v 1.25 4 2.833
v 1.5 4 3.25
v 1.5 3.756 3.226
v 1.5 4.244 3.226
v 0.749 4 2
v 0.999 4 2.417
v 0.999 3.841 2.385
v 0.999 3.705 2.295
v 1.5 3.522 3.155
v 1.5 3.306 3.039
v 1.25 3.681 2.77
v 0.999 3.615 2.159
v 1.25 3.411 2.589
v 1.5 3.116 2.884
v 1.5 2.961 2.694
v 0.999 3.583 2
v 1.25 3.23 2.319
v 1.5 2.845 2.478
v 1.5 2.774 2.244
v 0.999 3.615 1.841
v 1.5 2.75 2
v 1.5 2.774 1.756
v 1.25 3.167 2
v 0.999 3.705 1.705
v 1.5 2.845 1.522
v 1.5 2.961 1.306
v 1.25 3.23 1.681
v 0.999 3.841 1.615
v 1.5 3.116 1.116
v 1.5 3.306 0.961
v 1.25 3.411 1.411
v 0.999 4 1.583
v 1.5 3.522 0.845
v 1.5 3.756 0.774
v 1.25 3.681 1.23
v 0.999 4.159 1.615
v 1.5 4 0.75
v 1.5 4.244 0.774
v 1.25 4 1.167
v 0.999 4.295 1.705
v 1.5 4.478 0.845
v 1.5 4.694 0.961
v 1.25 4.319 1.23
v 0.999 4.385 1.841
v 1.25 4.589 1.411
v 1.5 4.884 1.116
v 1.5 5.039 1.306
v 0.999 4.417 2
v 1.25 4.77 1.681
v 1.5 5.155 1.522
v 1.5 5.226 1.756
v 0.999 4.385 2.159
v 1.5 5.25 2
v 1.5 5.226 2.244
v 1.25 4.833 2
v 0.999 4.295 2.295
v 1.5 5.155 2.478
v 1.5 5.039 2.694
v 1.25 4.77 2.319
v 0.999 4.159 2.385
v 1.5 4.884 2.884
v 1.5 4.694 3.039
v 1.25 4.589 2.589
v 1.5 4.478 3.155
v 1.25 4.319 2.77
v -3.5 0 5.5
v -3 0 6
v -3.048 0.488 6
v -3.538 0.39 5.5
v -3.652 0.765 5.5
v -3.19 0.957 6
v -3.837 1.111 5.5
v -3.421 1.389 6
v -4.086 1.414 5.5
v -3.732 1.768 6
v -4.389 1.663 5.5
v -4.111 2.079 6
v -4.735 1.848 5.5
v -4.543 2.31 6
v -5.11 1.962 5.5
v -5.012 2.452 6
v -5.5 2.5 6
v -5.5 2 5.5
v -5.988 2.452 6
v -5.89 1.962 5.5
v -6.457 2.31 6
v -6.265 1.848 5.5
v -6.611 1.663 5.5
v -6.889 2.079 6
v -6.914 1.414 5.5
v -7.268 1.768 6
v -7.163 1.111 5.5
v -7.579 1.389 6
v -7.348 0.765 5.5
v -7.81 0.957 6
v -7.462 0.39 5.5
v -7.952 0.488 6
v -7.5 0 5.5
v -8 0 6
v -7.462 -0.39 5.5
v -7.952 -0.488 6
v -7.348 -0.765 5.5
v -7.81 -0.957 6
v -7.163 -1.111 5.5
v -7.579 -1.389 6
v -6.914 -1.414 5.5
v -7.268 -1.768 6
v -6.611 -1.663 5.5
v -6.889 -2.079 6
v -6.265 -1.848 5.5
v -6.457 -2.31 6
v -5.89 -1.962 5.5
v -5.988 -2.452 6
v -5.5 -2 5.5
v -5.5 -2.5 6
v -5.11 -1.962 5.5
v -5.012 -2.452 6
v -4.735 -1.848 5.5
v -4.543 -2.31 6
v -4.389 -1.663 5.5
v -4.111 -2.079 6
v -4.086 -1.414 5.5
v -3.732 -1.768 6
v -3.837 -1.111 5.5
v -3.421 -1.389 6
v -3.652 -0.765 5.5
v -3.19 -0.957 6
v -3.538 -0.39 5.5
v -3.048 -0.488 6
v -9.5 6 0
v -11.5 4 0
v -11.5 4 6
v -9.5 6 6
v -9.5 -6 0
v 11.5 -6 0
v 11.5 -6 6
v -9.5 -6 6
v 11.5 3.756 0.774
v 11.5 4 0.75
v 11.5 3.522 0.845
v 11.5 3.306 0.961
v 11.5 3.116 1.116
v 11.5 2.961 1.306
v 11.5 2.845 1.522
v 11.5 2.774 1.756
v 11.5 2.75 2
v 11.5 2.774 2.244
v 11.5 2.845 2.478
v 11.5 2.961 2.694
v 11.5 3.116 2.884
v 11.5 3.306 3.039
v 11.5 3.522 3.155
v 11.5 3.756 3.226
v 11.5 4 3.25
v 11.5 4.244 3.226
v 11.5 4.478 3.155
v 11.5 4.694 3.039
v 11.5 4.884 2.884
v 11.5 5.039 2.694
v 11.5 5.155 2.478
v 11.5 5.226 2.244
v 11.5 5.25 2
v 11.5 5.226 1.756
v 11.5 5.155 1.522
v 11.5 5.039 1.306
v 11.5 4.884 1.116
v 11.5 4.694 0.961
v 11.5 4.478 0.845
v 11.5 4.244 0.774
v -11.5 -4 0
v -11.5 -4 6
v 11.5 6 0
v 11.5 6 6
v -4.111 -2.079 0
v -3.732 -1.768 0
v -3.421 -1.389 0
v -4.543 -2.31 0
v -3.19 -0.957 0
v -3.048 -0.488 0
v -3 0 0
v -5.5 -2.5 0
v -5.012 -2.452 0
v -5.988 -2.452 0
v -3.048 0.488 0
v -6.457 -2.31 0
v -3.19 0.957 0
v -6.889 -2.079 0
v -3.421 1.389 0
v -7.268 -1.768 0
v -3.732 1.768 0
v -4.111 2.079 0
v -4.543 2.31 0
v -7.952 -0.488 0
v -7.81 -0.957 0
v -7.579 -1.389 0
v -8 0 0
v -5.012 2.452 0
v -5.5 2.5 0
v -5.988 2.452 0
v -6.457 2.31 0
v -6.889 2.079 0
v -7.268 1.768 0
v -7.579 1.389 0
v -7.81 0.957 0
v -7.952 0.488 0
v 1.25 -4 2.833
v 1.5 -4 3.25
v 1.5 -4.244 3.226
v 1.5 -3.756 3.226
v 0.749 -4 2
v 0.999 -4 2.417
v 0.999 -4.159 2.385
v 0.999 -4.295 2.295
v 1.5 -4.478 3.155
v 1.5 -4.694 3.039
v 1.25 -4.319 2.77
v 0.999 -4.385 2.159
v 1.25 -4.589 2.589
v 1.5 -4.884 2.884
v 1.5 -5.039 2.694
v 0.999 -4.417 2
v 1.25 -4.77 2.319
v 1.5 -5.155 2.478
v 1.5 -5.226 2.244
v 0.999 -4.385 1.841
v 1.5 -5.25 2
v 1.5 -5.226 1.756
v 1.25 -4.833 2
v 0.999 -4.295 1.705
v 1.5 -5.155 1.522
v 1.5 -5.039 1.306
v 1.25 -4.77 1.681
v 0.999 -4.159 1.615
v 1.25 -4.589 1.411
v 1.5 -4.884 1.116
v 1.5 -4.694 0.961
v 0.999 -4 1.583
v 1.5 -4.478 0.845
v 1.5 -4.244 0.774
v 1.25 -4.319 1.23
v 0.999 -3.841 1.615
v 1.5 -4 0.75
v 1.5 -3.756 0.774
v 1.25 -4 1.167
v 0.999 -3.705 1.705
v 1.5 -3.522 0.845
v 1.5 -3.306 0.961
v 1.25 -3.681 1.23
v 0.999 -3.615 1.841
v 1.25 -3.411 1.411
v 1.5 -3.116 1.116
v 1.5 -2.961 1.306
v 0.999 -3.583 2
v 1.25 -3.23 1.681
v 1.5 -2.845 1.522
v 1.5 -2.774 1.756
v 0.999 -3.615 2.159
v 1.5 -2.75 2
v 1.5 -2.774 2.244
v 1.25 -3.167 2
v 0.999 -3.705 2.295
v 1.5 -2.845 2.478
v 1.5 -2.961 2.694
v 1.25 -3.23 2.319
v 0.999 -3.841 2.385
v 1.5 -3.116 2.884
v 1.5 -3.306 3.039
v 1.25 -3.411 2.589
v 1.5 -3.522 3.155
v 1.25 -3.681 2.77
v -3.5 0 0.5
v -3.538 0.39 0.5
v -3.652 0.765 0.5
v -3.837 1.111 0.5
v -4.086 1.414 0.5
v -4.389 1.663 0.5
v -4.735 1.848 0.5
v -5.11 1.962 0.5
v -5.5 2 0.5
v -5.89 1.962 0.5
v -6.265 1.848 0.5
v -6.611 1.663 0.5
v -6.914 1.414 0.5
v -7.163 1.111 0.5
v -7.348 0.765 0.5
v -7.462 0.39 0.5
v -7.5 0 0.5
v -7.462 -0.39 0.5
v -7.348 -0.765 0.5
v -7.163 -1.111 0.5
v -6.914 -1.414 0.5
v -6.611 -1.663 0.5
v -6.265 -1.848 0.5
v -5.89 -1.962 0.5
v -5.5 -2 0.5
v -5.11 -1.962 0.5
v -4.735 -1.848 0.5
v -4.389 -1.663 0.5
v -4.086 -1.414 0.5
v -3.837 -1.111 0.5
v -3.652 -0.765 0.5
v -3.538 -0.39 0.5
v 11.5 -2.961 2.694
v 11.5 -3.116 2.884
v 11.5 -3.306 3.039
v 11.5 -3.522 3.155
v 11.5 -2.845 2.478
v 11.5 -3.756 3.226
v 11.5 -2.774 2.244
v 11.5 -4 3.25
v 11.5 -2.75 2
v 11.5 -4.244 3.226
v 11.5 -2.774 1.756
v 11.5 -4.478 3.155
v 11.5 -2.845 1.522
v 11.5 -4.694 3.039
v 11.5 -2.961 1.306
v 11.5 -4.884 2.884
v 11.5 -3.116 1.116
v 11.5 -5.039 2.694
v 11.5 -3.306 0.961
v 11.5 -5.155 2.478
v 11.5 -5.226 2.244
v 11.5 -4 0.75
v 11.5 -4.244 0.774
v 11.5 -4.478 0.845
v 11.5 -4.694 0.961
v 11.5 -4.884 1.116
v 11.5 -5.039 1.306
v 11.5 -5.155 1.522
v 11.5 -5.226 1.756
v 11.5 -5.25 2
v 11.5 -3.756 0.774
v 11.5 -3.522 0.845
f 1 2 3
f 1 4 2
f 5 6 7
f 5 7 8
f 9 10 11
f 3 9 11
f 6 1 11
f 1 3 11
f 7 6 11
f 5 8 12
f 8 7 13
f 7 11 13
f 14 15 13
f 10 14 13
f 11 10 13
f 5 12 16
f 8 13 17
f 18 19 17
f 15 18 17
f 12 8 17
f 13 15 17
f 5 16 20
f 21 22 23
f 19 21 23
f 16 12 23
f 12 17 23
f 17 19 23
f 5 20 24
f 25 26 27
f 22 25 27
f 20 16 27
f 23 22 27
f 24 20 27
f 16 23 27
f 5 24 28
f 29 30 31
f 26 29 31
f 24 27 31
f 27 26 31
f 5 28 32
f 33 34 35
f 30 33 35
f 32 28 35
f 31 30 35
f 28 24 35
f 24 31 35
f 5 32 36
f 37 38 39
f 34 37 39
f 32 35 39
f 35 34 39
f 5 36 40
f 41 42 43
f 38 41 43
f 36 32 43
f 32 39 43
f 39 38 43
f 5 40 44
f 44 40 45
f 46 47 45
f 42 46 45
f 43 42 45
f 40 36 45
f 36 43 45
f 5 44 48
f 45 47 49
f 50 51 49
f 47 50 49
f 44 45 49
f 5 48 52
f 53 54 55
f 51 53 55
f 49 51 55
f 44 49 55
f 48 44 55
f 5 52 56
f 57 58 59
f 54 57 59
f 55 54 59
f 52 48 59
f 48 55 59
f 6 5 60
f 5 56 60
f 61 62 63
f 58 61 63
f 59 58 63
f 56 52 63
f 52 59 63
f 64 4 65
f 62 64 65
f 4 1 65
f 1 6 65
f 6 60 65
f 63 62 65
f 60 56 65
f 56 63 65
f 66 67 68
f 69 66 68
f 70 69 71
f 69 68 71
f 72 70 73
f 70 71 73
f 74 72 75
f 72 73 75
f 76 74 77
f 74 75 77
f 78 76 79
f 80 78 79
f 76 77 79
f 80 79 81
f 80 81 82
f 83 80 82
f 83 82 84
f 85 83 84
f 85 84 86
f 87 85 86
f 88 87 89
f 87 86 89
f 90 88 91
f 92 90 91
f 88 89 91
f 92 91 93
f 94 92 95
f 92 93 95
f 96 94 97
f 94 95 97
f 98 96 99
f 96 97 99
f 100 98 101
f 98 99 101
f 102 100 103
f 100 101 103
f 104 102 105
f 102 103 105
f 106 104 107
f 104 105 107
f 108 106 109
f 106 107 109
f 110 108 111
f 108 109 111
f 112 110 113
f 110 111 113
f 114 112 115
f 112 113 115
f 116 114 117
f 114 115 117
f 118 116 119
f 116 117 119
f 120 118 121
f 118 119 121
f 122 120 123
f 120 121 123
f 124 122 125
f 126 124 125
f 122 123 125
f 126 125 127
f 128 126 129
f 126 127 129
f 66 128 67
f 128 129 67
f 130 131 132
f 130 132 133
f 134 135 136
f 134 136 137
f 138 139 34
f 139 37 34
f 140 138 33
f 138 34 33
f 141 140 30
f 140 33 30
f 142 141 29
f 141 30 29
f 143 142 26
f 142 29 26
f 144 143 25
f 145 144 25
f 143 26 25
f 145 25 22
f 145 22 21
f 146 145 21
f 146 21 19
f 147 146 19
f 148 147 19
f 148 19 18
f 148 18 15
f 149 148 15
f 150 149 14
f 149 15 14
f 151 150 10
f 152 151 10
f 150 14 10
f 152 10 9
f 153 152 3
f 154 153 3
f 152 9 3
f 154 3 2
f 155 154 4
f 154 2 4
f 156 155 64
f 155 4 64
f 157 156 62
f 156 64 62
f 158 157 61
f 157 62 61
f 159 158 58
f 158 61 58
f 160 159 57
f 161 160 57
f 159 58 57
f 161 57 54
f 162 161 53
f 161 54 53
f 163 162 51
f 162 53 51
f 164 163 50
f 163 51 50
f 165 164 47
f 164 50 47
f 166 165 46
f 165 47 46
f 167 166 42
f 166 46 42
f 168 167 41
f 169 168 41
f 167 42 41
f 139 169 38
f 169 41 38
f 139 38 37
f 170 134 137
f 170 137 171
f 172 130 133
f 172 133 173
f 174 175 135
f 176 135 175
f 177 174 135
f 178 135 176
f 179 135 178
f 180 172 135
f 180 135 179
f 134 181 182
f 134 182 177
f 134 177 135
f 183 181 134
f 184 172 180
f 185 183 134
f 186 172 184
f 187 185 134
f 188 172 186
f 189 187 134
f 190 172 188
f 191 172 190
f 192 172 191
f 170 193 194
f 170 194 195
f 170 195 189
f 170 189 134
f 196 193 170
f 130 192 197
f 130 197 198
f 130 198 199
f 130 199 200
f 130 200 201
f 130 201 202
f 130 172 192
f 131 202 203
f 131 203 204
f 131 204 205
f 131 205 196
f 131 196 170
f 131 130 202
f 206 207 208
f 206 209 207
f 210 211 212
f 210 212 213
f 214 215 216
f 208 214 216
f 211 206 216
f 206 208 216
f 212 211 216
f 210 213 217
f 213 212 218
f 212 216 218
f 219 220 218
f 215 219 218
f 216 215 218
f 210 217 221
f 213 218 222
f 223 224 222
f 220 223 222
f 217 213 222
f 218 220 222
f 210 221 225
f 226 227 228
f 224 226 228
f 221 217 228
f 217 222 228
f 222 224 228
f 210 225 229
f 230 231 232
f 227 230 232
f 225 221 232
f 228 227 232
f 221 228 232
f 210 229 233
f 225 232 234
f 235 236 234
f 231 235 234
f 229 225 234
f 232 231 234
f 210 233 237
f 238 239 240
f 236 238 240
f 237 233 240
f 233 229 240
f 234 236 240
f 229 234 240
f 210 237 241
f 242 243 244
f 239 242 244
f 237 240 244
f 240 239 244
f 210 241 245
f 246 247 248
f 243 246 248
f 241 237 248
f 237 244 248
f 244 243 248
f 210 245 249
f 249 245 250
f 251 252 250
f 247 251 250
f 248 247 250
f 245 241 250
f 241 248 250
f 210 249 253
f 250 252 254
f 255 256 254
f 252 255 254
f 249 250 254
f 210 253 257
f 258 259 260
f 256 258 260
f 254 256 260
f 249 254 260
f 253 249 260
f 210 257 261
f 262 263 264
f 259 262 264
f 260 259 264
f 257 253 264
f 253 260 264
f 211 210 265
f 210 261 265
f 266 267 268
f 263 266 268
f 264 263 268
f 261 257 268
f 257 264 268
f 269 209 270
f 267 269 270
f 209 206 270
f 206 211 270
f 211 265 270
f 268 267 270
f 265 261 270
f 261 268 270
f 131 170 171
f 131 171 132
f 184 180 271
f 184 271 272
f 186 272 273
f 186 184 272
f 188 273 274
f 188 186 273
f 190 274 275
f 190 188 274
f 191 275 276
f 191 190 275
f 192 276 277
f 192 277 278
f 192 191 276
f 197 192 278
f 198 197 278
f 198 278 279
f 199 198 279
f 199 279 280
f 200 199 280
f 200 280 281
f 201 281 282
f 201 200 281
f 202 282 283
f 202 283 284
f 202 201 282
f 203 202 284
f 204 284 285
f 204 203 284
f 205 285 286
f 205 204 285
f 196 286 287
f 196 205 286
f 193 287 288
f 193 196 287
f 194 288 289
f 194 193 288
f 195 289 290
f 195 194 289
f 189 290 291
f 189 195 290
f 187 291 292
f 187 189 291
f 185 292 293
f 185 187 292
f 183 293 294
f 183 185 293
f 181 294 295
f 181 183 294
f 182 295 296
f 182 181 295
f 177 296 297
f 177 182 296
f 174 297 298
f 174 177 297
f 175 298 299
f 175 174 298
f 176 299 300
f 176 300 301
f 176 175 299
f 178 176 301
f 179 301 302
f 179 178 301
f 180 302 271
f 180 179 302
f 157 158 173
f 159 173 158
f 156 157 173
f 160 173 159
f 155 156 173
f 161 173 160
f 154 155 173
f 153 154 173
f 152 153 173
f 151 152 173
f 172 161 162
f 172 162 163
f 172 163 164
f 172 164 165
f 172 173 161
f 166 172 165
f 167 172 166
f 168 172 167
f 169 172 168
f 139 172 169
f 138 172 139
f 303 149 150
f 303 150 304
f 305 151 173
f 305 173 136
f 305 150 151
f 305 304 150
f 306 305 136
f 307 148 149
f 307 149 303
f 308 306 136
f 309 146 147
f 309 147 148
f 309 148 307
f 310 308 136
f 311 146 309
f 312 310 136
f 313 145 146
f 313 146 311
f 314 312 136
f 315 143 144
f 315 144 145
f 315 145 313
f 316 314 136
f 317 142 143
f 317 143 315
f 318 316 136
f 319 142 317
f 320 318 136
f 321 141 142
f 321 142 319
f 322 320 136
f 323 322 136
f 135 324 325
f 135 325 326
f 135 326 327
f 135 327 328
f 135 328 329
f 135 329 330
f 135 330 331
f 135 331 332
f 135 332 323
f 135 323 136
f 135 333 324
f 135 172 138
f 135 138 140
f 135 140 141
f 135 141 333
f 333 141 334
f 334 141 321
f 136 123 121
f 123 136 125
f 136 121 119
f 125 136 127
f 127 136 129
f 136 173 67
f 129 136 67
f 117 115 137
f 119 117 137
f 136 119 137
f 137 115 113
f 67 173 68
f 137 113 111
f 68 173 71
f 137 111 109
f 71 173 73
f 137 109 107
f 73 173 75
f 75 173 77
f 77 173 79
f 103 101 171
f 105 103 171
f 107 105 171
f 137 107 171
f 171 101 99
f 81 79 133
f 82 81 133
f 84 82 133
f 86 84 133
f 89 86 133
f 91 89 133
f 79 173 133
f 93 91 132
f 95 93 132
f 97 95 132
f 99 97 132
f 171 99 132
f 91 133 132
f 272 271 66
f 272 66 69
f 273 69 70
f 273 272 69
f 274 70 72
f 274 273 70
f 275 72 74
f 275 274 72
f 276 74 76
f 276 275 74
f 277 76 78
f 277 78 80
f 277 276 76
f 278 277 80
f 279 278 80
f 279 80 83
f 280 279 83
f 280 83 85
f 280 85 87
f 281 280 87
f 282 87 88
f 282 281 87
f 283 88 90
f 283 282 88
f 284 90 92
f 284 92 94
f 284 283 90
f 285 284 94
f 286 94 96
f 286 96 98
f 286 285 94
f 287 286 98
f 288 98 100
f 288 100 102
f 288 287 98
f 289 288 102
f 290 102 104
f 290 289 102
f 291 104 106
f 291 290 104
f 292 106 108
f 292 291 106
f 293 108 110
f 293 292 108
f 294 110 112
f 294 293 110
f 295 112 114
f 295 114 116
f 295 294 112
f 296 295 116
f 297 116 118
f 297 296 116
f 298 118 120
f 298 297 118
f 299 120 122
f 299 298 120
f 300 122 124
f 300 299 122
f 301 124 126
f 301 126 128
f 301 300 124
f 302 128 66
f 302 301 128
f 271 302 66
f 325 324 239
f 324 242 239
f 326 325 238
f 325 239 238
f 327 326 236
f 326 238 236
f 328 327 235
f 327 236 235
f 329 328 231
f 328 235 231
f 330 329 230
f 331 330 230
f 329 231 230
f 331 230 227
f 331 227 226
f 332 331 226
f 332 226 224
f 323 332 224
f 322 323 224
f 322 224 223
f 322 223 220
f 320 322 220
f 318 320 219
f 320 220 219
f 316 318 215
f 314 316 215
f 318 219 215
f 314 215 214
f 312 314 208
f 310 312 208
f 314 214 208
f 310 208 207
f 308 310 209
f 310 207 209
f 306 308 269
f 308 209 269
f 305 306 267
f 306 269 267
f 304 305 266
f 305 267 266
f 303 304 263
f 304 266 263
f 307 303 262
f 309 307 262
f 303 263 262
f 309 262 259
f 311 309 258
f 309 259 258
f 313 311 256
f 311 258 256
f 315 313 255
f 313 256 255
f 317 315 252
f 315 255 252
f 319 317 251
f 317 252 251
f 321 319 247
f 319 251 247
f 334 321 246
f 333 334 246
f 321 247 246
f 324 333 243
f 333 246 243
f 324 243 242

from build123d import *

# Parameters (mm, degrees)
SKETCH5_R                 = 2
BOSS_EXTRUDE3_DEPTH       = 6
CHAMFER1_SIZE             = 0.5
M3X0_5_TAPPED_HOLE2_D     = 2.5
M3X0_5_TAPPED_HOLE2_DEPTH = 10
M3X0_5_TAPPED_HOLE2_TIP   = 0.751075774


with BuildPart() as part:
    # Sketch5 → Boss-Extrude3 (new body)
    with BuildSketch(Plane.XY):
        Polygon((-9.5, -6), (-11.5, -4), (-11.5, 4), (-9.5, 6), (11.5, 6), (11.5, -6), align=None)
        with Locations((-5.5, 0)):
            Circle(SKETCH5_R, mode=Mode.SUBTRACT)
    extrude(amount=BOSS_EXTRUDE3_DEPTH)

    # Chamfer1
    chamfer1_edges = [part.edges().sort_by_distance(p)[0] for p in [
        (-7.5, 0, 0),
        (-7.5, 0, 6),
    ]]
    chamfer(chamfer1_edges, length=CHAMFER1_SIZE)

    # M3x0.5 Tapped Hole2
    with Locations(Plane(origin=(11.5, 4, 2), x_dir=(0, 0, 1), z_dir=(1, 0, 0))):
        with Locations((0, 0), (0, 8)):
            Hole(M3X0_5_TAPPED_HOLE2_D / 2, depth=M3X0_5_TAPPED_HOLE2_DEPTH)
            with Locations((0, 0, -(M3X0_5_TAPPED_HOLE2_DEPTH + M3X0_5_TAPPED_HOLE2_TIP / 2))):  # 118° drill point
                Cone(0, M3X0_5_TAPPED_HOLE2_D / 2, M3X0_5_TAPPED_HOLE2_TIP, mode=Mode.SUBTRACT)


solid = part.part
